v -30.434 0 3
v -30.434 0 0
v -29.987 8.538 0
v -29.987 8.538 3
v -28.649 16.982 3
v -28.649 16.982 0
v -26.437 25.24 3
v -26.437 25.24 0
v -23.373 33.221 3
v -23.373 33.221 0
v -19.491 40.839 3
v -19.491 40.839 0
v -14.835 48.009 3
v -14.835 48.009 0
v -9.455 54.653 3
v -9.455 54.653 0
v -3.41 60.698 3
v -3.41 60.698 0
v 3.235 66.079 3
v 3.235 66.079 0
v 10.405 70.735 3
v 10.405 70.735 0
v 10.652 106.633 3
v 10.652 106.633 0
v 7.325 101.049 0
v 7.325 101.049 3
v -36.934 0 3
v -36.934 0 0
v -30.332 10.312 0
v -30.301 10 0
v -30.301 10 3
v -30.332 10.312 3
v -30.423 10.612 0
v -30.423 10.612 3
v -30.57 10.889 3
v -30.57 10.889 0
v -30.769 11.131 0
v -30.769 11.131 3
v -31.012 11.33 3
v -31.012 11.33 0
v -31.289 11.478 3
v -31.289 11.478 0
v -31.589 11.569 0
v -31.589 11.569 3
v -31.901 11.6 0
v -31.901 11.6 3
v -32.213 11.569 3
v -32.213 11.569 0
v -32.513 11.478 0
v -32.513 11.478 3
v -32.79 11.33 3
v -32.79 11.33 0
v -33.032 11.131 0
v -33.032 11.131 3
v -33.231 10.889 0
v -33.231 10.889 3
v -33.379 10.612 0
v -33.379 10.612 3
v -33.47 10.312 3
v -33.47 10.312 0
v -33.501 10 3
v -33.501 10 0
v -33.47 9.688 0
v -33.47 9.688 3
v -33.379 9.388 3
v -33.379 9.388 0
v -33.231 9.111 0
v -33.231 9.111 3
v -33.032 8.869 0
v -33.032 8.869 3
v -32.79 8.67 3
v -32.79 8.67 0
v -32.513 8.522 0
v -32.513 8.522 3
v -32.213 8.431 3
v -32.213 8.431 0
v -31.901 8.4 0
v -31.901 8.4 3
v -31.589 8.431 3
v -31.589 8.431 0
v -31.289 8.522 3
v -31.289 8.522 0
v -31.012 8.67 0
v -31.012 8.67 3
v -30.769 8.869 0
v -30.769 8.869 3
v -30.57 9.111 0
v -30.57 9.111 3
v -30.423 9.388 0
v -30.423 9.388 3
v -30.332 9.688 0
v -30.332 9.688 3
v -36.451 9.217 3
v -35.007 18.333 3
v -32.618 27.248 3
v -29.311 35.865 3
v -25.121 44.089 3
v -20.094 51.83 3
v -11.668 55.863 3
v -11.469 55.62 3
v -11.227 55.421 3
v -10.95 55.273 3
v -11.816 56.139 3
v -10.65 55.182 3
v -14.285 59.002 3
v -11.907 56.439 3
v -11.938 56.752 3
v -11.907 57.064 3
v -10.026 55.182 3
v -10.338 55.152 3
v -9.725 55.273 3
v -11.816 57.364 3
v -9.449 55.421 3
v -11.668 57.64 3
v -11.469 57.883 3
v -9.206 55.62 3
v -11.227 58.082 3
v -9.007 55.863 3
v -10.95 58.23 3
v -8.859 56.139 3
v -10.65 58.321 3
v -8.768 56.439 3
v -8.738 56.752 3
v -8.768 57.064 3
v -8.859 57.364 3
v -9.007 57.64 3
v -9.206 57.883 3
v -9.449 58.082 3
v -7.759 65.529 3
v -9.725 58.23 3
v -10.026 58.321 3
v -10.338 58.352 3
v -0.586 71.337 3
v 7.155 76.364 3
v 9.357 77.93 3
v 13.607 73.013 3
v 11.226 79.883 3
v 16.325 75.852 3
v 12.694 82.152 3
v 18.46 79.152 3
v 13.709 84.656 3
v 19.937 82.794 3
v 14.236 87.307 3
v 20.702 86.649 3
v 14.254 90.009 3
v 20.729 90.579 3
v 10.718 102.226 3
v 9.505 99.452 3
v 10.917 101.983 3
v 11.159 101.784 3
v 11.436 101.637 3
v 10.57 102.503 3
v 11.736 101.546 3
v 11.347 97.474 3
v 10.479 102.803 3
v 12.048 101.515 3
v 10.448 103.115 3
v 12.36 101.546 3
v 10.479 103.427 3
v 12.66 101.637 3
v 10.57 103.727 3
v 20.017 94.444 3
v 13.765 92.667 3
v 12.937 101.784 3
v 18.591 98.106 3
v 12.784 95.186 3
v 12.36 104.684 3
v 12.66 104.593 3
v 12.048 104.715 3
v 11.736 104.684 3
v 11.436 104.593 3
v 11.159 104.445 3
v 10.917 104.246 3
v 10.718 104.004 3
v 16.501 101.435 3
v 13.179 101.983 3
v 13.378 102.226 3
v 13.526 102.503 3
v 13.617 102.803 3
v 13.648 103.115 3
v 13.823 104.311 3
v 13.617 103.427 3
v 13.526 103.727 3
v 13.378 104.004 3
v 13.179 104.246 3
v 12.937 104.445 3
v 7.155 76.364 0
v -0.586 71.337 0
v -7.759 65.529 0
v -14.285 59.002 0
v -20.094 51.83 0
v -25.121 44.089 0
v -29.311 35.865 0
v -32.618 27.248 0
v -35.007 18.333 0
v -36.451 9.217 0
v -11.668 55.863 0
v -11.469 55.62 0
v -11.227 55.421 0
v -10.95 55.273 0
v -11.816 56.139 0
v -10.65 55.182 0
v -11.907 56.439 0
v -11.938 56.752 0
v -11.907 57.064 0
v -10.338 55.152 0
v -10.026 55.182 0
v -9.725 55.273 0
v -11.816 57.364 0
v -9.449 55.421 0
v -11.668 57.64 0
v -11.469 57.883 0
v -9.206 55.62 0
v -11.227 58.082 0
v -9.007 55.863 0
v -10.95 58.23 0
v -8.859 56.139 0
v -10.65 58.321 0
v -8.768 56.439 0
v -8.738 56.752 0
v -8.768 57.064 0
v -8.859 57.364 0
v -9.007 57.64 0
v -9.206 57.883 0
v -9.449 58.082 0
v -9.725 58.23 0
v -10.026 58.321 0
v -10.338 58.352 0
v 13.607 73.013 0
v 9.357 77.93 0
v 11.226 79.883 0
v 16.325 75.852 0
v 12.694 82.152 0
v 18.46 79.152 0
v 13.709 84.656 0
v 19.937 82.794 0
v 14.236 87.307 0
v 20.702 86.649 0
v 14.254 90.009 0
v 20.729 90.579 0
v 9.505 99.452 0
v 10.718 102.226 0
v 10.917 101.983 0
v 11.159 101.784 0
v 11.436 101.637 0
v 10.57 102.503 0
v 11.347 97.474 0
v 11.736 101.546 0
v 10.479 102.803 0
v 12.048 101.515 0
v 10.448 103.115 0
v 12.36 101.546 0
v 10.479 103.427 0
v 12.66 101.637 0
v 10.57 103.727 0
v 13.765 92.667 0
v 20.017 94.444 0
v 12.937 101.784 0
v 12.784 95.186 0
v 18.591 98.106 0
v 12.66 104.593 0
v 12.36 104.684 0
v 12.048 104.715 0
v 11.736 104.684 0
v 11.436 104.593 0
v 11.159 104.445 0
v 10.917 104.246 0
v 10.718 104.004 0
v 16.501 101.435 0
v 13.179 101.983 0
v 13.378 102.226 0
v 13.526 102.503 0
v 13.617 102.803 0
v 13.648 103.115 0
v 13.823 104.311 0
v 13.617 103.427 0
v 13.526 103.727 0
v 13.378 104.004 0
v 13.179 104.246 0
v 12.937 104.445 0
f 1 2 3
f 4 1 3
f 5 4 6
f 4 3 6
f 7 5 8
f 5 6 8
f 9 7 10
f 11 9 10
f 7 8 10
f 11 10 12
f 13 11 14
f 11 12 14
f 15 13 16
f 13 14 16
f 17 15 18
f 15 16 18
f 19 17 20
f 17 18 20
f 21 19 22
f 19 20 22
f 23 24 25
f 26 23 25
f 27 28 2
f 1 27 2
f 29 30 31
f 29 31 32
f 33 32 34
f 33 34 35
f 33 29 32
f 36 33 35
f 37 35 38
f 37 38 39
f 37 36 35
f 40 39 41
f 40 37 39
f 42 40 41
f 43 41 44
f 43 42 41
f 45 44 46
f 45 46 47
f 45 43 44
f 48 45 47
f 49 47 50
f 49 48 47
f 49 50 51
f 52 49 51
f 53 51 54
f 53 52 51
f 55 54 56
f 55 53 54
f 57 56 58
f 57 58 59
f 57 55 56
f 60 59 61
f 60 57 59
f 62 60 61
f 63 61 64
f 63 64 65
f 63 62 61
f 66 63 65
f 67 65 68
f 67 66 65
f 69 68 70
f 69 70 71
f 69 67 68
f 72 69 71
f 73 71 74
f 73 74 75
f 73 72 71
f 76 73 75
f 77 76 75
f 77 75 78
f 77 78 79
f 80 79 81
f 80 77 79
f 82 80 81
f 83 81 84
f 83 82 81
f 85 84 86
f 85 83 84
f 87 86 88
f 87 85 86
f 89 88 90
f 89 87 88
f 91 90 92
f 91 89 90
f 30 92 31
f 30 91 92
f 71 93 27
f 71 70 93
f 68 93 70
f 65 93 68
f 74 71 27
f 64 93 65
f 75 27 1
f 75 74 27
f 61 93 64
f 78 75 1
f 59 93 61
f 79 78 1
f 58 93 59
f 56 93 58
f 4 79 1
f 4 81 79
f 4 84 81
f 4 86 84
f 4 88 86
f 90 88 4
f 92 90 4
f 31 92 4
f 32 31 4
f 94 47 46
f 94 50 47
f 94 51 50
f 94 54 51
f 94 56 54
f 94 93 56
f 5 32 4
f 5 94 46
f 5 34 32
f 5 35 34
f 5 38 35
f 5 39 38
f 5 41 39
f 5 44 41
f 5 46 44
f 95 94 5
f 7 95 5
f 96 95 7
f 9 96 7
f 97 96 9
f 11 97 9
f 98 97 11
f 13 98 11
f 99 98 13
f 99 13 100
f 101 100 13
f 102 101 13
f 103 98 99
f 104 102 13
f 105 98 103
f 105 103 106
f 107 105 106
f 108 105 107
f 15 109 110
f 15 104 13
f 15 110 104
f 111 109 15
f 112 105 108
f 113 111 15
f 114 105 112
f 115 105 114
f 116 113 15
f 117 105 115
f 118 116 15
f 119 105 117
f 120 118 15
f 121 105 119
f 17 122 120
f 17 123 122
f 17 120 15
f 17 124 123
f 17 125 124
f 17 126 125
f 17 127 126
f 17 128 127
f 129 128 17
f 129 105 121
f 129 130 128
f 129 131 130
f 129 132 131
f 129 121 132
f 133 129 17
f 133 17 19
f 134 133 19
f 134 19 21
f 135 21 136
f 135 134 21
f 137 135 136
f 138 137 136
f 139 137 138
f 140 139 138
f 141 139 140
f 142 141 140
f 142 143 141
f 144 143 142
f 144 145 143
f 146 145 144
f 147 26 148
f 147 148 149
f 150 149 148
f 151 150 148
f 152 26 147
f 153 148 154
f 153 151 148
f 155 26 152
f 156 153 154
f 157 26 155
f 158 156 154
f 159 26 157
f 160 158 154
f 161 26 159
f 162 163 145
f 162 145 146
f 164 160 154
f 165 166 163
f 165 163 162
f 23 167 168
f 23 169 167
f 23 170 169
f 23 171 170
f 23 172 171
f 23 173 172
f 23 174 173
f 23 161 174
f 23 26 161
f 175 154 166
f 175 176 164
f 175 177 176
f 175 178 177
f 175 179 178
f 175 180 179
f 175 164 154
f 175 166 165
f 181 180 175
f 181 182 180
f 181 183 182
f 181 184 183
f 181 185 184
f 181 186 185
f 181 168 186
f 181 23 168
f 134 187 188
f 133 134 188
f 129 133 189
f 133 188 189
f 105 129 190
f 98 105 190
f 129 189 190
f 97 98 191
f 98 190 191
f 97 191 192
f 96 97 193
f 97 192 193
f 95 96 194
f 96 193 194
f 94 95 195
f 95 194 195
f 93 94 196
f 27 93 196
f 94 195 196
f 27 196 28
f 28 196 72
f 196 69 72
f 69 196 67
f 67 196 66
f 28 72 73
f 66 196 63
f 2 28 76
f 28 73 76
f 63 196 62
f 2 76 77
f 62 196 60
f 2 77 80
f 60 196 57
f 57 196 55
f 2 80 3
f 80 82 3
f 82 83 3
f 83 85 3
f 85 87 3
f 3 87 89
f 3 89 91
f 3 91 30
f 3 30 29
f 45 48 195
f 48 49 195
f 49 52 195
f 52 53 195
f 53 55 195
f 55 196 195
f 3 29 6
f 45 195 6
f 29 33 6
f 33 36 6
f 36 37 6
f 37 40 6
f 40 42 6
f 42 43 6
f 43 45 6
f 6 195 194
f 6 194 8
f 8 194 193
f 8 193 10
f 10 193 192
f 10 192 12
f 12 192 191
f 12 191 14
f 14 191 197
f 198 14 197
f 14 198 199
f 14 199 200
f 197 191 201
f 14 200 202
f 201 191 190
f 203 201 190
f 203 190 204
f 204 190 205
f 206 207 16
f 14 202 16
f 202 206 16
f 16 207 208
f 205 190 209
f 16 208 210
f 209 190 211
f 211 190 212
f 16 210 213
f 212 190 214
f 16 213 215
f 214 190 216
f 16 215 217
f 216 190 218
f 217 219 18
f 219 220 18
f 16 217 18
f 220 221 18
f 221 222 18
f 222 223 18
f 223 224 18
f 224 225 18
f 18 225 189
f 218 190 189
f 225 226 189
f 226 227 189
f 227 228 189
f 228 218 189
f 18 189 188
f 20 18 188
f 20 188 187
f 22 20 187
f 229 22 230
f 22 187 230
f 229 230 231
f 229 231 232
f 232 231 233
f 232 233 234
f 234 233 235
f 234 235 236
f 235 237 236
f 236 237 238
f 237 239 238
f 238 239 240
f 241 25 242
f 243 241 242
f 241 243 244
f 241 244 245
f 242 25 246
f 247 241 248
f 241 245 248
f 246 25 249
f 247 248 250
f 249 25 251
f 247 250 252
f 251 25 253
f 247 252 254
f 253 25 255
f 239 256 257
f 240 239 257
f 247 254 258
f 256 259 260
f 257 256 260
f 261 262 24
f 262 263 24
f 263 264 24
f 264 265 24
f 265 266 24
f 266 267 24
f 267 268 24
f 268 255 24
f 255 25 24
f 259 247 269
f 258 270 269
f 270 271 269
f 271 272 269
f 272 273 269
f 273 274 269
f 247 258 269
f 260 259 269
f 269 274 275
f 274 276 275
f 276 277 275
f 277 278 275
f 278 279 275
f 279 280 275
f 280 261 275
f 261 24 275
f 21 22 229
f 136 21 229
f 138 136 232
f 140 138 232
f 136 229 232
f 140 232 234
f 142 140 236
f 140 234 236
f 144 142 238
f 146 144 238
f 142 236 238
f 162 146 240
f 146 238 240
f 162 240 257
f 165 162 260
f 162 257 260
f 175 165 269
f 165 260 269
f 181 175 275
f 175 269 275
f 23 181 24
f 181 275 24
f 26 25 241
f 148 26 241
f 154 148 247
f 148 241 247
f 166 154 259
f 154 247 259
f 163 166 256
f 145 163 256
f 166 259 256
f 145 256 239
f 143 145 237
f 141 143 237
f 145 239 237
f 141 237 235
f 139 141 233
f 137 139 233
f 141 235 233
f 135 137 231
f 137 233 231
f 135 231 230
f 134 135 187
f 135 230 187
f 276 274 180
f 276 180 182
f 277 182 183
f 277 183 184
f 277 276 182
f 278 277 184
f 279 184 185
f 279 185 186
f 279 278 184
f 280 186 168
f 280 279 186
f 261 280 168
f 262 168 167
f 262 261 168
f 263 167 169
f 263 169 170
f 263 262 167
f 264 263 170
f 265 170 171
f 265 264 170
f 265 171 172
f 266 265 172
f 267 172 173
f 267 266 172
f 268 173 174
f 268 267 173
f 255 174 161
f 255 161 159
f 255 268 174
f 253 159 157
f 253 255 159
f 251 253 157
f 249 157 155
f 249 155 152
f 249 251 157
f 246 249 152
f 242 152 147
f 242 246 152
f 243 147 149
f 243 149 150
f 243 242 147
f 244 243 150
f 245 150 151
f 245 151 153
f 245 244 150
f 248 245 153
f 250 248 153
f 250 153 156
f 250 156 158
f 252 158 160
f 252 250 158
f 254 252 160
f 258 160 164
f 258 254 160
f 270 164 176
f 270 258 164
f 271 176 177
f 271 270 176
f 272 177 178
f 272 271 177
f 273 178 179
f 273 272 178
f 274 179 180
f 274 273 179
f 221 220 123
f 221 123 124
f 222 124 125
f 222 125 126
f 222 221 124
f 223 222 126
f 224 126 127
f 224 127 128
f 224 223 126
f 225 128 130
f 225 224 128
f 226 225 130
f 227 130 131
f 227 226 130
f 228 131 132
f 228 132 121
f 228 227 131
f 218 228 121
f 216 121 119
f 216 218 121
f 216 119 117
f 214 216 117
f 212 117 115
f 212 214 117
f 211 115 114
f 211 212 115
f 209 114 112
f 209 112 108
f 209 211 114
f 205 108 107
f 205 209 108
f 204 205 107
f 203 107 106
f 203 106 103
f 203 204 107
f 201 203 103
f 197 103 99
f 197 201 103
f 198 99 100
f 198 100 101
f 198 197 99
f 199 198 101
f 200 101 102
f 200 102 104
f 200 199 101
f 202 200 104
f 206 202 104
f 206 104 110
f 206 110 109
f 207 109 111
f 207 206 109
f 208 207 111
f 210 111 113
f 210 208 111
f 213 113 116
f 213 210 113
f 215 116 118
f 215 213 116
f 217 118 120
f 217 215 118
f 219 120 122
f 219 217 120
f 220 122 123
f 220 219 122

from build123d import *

# Parameters (mm, degrees)
SKETCH1_R           = 1.6
BOSS_EXTRUDE1_DEPTH = 3


with BuildPart() as part:
    # Sketch1 → Boss-Extrude1 (new body)
    with BuildSketch(Plane.XY):
        with BuildLine():
            Line((-36.934217786, 0), (-30.434217786, 0))
            ThreePointArc((-30.434217786, 0), (-19.491470952, 40.838887158), (10.404669372, 70.735027482))
            ThreePointArc((10.404669372, 70.735027482), (20.808844345, 88.613000102), (10.652125885, 106.632706869))
            Line((10.652125885, 106.632706869), (7.324830428, 101.048881572))
            ThreePointArc((7.324830428, 101.048881572), (14.308998775, 88.657806037), (7.154669372, 76.364192606))
            ThreePointArc((7.154669372, 76.364192606), (-25.120636077, 44.088887158), (-36.934217786, 0))
        make_face()
        with Locations((12.048125899, 103.114840794)):
            Circle(SKETCH1_R, mode=Mode.SUBTRACT)
        with Locations((-10.337645521, 56.751553408)):
            Circle(SKETCH1_R, mode=Mode.SUBTRACT)
        with Locations((-31.900795415, 10)):
            Circle(SKETCH1_R, mode=Mode.SUBTRACT)
    extrude(amount=BOSS_EXTRUDE1_DEPTH)


solid = part.part
